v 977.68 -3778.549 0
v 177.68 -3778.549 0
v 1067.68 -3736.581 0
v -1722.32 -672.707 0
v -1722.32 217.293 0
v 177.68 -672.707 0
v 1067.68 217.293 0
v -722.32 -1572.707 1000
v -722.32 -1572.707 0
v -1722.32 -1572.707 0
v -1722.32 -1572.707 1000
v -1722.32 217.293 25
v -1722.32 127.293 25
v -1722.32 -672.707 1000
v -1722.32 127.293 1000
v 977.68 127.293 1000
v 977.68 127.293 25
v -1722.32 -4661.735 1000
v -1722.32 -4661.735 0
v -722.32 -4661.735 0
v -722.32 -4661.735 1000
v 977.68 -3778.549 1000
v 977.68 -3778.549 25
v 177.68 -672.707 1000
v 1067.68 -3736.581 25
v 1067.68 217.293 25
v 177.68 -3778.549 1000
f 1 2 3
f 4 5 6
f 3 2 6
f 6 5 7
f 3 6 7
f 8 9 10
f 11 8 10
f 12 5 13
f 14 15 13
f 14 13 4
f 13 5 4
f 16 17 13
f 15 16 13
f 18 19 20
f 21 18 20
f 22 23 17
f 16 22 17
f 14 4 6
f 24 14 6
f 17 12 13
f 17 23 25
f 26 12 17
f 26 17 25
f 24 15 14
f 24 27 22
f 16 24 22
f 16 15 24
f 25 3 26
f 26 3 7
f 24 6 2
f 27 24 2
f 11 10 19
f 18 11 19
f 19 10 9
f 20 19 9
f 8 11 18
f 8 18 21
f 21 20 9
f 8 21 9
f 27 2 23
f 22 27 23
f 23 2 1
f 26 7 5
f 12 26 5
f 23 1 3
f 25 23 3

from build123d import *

# Parameters (mm, degrees)
F1_DEPTH = 1000
F2_DEPTH = 1000
F3_DEPTH = 25


with BuildPart() as f1:
    # F0 (on Top) → F1 (new body)
    with BuildSketch(Plane.XY):
        Polygon((-722.319901, -1572.706527), (-1722.319901, -1572.706527), (-1722.319901, -3778.548717), (-1722.319901, -4661.734821), (-722.319901, -4661.734821), (-722.319901, -3778.548717), align=None)
    extrude(amount=F1_DEPTH)


with BuildPart() as f2:
    # F0 (on Top) → F2 (new body)
    with BuildSketch(Plane.XY):
        Polygon((977.680099, 127.293473), (-1722.319901, 127.293473), (-1722.319901, -672.706527), (177.680099, -672.706527), (177.680099, -3778.548717), (977.680099, -3778.548717), align=None)
    extrude(amount=F2_DEPTH)

    # F0 (on Top) → F3 (join)
    with BuildSketch(Plane.XY):
        Polygon((-1722.319901, 217.293473), (-1722.319901, 127.293473), (977.680099, 127.293473), (1067.680099, -65.71215), (1067.680099, 217.293473), align=None)
        Polygon((1067.680099, -65.71215), (977.680099, 127.293473), (977.680099, -3778.548717), (1067.680099, -3736.581028), align=None)
    extrude(amount=F3_DEPTH)


solid = Compound([f1.part, f2.part])
